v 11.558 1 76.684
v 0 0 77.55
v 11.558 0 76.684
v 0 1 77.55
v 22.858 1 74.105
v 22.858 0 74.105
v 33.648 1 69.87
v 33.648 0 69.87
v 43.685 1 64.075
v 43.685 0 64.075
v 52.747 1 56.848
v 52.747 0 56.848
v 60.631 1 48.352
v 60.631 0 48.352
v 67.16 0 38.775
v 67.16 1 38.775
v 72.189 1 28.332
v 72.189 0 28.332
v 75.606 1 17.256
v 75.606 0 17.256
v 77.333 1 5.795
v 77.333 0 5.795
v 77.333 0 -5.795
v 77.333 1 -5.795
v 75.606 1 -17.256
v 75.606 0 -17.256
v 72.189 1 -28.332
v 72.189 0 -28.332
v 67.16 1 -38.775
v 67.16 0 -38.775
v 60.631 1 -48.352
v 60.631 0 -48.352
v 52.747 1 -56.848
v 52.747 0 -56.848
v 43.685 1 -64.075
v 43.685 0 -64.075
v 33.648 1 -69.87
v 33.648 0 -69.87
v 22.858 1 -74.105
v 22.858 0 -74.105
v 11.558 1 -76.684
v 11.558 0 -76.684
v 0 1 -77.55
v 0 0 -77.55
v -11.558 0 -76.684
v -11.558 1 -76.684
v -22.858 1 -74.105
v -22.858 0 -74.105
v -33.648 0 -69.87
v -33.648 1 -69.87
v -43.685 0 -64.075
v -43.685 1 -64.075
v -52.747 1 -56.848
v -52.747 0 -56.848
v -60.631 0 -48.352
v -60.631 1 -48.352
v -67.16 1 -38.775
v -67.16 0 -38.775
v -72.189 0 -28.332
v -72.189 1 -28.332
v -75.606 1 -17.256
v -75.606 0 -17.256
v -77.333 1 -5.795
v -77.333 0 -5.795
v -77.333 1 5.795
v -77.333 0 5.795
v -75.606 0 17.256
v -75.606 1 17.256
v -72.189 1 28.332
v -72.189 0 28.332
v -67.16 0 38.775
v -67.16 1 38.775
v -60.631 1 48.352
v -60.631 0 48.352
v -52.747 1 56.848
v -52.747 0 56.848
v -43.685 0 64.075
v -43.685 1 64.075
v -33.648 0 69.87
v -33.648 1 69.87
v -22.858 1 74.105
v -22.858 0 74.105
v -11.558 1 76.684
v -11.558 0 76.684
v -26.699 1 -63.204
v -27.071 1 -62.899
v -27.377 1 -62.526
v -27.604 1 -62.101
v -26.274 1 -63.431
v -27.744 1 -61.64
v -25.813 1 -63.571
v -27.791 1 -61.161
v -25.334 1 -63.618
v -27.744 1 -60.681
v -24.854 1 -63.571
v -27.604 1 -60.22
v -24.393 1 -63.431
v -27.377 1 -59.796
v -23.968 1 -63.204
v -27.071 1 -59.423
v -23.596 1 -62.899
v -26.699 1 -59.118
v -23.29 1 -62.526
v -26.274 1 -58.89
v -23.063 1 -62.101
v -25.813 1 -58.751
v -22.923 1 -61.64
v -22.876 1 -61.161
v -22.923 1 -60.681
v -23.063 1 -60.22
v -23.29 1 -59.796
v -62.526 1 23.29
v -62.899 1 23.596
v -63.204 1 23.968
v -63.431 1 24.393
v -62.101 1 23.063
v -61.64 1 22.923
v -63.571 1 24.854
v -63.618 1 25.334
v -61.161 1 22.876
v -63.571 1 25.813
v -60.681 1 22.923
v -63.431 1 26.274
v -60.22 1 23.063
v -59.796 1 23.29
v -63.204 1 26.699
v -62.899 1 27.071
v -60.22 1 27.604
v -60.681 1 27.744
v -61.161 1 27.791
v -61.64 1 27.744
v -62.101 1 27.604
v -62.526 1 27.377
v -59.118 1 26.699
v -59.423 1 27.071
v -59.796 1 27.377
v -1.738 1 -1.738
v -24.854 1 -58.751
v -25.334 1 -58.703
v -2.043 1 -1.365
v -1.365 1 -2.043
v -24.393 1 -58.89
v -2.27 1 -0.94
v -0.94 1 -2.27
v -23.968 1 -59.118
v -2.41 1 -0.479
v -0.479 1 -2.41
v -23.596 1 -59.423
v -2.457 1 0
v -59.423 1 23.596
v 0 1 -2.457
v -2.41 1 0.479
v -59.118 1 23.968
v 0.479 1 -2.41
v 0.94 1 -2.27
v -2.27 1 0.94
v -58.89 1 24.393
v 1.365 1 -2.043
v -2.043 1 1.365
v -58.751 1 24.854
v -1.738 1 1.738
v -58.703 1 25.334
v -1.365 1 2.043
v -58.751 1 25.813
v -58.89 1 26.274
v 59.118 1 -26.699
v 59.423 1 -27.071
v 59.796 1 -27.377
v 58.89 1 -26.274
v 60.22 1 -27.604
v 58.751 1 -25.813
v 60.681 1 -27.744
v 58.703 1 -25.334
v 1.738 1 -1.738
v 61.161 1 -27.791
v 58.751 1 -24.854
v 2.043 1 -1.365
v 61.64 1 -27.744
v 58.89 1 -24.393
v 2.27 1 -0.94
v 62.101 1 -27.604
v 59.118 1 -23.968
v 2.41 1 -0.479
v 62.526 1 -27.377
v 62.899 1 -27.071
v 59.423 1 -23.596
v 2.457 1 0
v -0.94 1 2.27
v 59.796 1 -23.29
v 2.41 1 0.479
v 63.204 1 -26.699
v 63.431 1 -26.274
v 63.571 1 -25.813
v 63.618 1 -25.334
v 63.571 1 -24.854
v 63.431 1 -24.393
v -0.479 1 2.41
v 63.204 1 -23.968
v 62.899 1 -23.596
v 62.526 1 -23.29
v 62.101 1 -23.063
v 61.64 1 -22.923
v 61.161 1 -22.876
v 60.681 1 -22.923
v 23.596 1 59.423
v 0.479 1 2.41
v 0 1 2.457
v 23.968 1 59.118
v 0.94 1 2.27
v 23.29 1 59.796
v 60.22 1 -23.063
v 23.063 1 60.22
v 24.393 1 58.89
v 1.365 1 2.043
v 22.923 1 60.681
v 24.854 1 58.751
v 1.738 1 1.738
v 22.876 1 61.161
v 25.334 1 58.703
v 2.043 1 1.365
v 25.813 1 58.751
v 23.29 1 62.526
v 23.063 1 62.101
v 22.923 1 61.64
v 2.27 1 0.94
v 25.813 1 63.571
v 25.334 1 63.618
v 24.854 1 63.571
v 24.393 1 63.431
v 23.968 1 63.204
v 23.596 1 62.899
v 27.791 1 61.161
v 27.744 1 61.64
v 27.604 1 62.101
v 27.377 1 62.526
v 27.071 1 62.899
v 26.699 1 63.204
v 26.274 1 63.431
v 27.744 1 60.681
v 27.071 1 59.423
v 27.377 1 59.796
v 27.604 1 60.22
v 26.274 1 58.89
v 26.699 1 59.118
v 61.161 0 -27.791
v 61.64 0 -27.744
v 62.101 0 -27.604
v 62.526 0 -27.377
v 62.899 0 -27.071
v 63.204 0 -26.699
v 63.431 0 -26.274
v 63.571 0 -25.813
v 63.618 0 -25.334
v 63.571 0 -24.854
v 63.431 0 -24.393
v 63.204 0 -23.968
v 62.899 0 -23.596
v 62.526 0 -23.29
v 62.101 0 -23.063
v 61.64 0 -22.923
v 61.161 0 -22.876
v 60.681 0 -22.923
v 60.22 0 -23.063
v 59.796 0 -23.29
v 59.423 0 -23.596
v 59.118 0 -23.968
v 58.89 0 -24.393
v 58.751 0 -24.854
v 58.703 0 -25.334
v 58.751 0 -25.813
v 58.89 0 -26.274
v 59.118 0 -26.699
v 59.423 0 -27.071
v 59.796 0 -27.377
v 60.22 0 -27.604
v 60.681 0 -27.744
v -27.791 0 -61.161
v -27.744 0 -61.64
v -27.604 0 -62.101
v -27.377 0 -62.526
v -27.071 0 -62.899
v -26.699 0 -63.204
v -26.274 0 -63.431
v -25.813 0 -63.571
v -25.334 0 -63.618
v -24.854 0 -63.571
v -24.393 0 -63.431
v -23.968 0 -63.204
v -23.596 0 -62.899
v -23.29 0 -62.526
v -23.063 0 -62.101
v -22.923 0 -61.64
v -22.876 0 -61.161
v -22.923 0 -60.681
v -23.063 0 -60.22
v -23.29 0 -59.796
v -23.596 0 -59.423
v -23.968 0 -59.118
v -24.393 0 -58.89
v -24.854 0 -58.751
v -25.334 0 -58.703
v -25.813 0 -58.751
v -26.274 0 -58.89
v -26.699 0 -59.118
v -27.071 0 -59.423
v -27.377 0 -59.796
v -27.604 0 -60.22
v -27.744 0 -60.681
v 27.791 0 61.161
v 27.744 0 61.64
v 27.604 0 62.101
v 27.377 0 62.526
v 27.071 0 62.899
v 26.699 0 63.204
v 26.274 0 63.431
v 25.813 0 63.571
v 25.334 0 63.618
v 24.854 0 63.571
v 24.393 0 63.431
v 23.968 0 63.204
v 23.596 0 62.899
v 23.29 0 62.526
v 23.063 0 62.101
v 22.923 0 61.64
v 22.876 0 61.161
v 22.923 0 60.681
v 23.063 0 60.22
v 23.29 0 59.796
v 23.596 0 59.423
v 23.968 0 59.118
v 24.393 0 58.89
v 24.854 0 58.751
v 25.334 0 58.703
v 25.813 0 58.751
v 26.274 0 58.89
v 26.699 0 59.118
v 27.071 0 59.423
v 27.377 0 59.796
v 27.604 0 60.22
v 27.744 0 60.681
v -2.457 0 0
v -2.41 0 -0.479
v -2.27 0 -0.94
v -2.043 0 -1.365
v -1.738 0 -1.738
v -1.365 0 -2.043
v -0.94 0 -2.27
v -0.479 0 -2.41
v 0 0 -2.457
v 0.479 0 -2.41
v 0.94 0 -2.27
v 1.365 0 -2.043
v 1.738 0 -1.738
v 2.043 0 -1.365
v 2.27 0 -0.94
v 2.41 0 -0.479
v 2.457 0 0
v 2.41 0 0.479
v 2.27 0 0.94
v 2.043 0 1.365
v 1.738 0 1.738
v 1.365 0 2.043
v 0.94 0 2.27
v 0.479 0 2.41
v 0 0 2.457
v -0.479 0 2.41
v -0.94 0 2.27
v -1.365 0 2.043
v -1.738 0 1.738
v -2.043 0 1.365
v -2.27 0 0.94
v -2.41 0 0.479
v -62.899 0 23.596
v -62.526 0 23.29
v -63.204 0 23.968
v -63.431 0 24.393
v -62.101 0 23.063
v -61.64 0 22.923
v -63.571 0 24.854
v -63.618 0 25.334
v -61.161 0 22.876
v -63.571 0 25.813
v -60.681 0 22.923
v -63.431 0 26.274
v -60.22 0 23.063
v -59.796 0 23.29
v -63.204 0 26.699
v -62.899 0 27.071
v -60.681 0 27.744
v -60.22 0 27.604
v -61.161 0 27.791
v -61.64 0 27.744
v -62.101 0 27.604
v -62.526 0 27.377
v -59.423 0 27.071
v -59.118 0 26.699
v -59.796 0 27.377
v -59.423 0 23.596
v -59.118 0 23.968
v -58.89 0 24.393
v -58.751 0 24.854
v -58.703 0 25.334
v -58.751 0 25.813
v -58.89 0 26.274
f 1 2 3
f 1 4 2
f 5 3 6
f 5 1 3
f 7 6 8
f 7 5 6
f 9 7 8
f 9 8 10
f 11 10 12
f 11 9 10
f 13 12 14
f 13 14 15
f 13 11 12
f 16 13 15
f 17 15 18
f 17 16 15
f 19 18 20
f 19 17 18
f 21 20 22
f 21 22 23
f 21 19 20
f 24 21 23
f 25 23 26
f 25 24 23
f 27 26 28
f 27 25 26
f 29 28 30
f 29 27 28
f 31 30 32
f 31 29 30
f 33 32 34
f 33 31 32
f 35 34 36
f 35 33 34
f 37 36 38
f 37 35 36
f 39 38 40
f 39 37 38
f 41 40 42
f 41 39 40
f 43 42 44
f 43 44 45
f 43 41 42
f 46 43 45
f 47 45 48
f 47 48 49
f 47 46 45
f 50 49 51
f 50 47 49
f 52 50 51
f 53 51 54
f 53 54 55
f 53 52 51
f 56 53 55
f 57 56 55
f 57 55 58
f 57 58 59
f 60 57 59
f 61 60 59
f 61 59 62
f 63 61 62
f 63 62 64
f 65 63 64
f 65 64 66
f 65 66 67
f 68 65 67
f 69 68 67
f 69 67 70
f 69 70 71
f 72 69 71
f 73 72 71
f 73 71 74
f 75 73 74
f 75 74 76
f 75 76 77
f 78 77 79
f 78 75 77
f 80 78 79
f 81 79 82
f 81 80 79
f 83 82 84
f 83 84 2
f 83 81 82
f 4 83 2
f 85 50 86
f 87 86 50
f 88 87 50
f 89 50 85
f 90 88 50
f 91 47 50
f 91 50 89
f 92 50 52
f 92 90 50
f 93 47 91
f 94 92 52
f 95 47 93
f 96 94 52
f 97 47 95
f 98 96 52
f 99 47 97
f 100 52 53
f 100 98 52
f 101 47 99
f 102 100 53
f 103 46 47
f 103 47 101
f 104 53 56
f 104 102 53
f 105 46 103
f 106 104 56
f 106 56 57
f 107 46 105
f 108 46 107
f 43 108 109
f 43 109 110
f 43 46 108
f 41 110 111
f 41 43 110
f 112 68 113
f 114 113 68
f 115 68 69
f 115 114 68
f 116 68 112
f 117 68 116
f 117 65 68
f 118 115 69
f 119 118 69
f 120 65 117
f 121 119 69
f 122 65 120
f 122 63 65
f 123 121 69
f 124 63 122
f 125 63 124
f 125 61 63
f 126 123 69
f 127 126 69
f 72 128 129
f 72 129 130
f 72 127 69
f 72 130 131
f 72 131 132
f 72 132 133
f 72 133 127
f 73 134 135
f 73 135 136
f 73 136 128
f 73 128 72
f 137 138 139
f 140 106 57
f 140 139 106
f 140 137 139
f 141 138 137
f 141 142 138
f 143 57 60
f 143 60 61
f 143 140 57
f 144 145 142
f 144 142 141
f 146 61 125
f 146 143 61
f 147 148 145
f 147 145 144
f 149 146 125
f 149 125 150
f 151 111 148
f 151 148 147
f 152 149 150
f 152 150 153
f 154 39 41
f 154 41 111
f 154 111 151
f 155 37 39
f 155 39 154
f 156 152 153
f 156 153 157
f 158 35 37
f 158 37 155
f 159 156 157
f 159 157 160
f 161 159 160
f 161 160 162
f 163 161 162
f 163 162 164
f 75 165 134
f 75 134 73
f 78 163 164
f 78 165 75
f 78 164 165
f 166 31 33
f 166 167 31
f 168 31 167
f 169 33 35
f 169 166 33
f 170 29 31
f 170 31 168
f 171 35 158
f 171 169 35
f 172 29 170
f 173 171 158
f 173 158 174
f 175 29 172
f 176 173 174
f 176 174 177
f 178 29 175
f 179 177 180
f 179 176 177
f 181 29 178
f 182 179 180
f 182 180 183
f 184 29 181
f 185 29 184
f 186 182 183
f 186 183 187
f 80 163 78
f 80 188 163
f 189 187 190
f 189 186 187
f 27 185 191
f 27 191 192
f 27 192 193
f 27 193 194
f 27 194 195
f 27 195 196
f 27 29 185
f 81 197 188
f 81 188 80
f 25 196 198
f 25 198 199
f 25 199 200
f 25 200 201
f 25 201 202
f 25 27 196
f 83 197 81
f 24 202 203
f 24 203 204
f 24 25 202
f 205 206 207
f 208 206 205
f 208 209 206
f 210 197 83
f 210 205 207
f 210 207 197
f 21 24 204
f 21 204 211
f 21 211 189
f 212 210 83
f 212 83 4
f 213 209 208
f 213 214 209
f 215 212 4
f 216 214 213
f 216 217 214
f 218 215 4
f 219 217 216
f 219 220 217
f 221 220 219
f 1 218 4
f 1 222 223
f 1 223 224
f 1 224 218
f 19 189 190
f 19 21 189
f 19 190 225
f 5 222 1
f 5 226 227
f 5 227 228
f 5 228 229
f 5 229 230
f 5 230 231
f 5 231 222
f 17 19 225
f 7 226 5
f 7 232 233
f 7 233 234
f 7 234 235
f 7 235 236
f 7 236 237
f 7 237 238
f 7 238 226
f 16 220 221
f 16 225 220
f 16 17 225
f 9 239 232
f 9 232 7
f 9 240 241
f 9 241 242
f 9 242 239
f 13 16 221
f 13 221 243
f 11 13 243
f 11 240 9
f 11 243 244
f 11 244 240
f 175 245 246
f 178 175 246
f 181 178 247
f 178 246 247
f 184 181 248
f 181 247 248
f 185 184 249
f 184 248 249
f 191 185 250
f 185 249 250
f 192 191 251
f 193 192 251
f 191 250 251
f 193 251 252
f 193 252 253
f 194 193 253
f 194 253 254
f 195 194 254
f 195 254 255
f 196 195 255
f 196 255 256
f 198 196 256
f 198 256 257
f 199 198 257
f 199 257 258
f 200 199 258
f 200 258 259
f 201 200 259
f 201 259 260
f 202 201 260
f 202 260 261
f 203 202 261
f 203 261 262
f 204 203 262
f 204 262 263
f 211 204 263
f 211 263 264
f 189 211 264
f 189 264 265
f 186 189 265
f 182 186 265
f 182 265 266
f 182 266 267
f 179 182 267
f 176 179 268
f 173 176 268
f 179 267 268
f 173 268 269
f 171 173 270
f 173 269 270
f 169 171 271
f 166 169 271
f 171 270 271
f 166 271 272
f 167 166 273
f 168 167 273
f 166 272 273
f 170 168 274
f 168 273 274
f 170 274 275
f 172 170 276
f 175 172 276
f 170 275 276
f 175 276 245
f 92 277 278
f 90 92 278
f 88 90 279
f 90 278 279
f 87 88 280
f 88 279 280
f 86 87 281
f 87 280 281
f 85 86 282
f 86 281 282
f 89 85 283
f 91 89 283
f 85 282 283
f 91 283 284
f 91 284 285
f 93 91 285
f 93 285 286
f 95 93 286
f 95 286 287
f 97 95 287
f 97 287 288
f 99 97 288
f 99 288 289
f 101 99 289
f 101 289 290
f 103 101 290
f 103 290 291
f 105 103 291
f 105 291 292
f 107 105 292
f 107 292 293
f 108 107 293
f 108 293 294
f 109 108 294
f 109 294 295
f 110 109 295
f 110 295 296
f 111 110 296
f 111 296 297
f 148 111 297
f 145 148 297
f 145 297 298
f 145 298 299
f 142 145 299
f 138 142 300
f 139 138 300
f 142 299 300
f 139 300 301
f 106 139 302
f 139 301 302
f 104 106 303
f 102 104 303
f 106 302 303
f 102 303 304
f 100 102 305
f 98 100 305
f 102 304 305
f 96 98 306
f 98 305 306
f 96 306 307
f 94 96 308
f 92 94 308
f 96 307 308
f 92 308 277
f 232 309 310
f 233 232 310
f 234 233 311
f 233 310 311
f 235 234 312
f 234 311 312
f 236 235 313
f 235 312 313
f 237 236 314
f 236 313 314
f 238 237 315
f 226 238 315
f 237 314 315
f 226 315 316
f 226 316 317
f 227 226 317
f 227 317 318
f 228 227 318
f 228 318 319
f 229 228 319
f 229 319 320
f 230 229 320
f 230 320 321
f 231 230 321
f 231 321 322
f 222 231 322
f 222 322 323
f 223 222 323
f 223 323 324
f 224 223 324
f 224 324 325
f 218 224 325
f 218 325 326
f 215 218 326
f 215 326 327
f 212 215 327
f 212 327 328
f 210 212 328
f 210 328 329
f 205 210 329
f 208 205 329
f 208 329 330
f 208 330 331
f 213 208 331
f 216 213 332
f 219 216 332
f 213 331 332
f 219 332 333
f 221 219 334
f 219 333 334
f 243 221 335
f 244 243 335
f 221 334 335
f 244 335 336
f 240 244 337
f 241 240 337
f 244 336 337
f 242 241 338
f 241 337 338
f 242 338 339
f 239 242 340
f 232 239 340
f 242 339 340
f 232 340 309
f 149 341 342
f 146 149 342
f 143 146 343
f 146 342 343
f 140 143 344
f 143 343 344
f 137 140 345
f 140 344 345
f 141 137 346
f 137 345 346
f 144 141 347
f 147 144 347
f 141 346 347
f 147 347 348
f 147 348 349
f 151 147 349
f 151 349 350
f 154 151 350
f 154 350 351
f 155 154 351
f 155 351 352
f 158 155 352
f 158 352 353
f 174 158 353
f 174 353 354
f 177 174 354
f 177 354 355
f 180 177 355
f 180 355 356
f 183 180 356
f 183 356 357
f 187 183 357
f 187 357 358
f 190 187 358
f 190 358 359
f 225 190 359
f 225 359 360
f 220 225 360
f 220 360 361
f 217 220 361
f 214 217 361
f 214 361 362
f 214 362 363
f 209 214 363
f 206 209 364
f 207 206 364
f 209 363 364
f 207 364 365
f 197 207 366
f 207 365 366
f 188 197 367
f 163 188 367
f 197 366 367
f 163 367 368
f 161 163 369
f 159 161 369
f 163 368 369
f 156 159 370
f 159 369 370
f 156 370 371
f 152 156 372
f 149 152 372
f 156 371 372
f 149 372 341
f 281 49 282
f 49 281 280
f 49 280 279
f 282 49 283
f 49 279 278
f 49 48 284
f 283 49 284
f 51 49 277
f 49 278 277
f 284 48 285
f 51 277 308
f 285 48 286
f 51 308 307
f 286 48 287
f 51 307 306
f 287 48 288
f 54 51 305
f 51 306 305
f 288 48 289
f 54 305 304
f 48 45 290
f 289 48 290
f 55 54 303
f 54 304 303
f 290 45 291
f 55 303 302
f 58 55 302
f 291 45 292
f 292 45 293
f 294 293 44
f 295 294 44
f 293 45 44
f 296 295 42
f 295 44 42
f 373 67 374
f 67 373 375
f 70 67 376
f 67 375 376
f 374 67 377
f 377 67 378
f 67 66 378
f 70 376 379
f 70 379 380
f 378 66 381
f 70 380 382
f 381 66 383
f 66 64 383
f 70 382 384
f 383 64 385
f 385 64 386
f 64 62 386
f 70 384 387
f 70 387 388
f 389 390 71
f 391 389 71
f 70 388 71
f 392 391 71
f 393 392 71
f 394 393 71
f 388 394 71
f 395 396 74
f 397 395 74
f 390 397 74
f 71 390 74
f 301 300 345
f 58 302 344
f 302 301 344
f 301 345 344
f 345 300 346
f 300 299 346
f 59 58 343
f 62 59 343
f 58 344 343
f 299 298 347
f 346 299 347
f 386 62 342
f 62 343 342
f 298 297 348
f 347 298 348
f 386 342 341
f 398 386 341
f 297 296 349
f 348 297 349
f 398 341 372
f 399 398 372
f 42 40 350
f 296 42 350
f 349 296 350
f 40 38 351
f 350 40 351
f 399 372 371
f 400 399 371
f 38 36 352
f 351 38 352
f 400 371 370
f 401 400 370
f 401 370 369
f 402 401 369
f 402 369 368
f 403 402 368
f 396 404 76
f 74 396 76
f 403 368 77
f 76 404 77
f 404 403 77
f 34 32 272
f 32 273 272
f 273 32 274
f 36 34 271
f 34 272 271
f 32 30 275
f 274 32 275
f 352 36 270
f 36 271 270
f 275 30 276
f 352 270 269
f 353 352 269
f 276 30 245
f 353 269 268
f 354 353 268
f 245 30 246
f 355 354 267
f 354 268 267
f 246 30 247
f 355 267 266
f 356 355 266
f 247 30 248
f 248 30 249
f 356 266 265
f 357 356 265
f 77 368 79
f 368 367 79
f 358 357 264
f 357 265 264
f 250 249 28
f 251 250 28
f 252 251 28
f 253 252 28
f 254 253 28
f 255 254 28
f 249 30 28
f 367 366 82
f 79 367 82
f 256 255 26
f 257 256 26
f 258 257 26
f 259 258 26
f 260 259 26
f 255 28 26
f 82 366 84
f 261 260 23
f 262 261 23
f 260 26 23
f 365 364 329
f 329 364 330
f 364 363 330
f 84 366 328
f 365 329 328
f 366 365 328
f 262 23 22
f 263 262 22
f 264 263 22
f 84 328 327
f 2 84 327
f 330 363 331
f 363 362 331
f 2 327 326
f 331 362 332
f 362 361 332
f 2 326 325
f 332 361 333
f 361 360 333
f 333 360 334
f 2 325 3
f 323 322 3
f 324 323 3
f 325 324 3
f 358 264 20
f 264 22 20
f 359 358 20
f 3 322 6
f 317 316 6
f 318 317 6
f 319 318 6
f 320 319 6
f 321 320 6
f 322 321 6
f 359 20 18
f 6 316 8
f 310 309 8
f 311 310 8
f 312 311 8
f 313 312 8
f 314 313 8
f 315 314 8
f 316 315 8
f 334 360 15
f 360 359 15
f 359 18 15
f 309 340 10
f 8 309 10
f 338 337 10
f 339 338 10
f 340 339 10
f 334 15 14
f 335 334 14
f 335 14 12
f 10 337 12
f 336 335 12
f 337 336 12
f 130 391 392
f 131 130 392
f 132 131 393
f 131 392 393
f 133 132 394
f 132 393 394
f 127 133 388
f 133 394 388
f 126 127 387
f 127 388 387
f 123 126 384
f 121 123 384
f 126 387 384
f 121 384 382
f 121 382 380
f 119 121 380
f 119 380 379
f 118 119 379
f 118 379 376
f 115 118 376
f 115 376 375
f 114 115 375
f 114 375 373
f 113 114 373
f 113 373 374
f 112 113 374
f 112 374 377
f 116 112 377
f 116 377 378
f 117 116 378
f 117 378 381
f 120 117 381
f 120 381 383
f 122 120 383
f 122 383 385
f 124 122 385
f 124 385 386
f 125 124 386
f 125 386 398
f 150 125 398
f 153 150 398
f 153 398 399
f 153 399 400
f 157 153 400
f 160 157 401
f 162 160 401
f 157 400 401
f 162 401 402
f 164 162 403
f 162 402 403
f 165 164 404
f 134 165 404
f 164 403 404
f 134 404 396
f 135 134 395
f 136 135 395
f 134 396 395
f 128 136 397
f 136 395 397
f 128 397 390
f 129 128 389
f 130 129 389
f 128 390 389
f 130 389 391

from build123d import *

# Parameters (mm, degrees)
SKETCH2_W                    = 77.55
SKETCH2_H                    = 1
F_10_0_1935_DIAMETER_HOLE1_D = 4.9149
CIRPATTERN3_COUNT            = 4
F_10_0_1935_DIAMETER_HOLE2_D = 4.9149


with BuildPart() as part:
    # Sketch2 → Revolve1 (revolve)
    with BuildSketch(Plane(origin=(0, 0, 0), x_dir=(0, 0, -1), z_dir=(1, 0, 0))):
        with Locations((-38.775, 0.5)):
            Rectangle(SKETCH2_W, SKETCH2_H)
    revolve(axis=Axis((0, -0.05, 0), (0, 1, 0)))

    # #10 (0.1935) Diameter Hole1 (through all)
    with Locations(Plane(origin=(0, 1, 0), x_dir=(1, 0, 0), z_dir=(0, 1, 0))):
        with Locations((-25.333643223, 61.160825052)):
            f_10_0_1935_diameter_hole1 = Hole(F_10_0_1935_DIAMETER_HOLE1_D / 2)

    # CirPattern3: #10 (0.1935) Diameter Hole1 ×4 about axis
    cirpattern3_axis = Axis((0, 0, 0), (0, 1, 0))
    for i in range(1, CIRPATTERN3_COUNT):
        add(f_10_0_1935_diameter_hole1.rotate(cirpattern3_axis, i * 360 / CIRPATTERN3_COUNT), mode=Mode.SUBTRACT)

    # #10 (0.1935) Diameter Hole2 (through all)
    with Locations(Plane(origin=(0, 1, 0), x_dir=(1, 0, 0), z_dir=(0, 1, 0))):
        with Locations((0, 0)):
            Hole(F_10_0_1935_DIAMETER_HOLE2_D / 2)


solid = part.part
